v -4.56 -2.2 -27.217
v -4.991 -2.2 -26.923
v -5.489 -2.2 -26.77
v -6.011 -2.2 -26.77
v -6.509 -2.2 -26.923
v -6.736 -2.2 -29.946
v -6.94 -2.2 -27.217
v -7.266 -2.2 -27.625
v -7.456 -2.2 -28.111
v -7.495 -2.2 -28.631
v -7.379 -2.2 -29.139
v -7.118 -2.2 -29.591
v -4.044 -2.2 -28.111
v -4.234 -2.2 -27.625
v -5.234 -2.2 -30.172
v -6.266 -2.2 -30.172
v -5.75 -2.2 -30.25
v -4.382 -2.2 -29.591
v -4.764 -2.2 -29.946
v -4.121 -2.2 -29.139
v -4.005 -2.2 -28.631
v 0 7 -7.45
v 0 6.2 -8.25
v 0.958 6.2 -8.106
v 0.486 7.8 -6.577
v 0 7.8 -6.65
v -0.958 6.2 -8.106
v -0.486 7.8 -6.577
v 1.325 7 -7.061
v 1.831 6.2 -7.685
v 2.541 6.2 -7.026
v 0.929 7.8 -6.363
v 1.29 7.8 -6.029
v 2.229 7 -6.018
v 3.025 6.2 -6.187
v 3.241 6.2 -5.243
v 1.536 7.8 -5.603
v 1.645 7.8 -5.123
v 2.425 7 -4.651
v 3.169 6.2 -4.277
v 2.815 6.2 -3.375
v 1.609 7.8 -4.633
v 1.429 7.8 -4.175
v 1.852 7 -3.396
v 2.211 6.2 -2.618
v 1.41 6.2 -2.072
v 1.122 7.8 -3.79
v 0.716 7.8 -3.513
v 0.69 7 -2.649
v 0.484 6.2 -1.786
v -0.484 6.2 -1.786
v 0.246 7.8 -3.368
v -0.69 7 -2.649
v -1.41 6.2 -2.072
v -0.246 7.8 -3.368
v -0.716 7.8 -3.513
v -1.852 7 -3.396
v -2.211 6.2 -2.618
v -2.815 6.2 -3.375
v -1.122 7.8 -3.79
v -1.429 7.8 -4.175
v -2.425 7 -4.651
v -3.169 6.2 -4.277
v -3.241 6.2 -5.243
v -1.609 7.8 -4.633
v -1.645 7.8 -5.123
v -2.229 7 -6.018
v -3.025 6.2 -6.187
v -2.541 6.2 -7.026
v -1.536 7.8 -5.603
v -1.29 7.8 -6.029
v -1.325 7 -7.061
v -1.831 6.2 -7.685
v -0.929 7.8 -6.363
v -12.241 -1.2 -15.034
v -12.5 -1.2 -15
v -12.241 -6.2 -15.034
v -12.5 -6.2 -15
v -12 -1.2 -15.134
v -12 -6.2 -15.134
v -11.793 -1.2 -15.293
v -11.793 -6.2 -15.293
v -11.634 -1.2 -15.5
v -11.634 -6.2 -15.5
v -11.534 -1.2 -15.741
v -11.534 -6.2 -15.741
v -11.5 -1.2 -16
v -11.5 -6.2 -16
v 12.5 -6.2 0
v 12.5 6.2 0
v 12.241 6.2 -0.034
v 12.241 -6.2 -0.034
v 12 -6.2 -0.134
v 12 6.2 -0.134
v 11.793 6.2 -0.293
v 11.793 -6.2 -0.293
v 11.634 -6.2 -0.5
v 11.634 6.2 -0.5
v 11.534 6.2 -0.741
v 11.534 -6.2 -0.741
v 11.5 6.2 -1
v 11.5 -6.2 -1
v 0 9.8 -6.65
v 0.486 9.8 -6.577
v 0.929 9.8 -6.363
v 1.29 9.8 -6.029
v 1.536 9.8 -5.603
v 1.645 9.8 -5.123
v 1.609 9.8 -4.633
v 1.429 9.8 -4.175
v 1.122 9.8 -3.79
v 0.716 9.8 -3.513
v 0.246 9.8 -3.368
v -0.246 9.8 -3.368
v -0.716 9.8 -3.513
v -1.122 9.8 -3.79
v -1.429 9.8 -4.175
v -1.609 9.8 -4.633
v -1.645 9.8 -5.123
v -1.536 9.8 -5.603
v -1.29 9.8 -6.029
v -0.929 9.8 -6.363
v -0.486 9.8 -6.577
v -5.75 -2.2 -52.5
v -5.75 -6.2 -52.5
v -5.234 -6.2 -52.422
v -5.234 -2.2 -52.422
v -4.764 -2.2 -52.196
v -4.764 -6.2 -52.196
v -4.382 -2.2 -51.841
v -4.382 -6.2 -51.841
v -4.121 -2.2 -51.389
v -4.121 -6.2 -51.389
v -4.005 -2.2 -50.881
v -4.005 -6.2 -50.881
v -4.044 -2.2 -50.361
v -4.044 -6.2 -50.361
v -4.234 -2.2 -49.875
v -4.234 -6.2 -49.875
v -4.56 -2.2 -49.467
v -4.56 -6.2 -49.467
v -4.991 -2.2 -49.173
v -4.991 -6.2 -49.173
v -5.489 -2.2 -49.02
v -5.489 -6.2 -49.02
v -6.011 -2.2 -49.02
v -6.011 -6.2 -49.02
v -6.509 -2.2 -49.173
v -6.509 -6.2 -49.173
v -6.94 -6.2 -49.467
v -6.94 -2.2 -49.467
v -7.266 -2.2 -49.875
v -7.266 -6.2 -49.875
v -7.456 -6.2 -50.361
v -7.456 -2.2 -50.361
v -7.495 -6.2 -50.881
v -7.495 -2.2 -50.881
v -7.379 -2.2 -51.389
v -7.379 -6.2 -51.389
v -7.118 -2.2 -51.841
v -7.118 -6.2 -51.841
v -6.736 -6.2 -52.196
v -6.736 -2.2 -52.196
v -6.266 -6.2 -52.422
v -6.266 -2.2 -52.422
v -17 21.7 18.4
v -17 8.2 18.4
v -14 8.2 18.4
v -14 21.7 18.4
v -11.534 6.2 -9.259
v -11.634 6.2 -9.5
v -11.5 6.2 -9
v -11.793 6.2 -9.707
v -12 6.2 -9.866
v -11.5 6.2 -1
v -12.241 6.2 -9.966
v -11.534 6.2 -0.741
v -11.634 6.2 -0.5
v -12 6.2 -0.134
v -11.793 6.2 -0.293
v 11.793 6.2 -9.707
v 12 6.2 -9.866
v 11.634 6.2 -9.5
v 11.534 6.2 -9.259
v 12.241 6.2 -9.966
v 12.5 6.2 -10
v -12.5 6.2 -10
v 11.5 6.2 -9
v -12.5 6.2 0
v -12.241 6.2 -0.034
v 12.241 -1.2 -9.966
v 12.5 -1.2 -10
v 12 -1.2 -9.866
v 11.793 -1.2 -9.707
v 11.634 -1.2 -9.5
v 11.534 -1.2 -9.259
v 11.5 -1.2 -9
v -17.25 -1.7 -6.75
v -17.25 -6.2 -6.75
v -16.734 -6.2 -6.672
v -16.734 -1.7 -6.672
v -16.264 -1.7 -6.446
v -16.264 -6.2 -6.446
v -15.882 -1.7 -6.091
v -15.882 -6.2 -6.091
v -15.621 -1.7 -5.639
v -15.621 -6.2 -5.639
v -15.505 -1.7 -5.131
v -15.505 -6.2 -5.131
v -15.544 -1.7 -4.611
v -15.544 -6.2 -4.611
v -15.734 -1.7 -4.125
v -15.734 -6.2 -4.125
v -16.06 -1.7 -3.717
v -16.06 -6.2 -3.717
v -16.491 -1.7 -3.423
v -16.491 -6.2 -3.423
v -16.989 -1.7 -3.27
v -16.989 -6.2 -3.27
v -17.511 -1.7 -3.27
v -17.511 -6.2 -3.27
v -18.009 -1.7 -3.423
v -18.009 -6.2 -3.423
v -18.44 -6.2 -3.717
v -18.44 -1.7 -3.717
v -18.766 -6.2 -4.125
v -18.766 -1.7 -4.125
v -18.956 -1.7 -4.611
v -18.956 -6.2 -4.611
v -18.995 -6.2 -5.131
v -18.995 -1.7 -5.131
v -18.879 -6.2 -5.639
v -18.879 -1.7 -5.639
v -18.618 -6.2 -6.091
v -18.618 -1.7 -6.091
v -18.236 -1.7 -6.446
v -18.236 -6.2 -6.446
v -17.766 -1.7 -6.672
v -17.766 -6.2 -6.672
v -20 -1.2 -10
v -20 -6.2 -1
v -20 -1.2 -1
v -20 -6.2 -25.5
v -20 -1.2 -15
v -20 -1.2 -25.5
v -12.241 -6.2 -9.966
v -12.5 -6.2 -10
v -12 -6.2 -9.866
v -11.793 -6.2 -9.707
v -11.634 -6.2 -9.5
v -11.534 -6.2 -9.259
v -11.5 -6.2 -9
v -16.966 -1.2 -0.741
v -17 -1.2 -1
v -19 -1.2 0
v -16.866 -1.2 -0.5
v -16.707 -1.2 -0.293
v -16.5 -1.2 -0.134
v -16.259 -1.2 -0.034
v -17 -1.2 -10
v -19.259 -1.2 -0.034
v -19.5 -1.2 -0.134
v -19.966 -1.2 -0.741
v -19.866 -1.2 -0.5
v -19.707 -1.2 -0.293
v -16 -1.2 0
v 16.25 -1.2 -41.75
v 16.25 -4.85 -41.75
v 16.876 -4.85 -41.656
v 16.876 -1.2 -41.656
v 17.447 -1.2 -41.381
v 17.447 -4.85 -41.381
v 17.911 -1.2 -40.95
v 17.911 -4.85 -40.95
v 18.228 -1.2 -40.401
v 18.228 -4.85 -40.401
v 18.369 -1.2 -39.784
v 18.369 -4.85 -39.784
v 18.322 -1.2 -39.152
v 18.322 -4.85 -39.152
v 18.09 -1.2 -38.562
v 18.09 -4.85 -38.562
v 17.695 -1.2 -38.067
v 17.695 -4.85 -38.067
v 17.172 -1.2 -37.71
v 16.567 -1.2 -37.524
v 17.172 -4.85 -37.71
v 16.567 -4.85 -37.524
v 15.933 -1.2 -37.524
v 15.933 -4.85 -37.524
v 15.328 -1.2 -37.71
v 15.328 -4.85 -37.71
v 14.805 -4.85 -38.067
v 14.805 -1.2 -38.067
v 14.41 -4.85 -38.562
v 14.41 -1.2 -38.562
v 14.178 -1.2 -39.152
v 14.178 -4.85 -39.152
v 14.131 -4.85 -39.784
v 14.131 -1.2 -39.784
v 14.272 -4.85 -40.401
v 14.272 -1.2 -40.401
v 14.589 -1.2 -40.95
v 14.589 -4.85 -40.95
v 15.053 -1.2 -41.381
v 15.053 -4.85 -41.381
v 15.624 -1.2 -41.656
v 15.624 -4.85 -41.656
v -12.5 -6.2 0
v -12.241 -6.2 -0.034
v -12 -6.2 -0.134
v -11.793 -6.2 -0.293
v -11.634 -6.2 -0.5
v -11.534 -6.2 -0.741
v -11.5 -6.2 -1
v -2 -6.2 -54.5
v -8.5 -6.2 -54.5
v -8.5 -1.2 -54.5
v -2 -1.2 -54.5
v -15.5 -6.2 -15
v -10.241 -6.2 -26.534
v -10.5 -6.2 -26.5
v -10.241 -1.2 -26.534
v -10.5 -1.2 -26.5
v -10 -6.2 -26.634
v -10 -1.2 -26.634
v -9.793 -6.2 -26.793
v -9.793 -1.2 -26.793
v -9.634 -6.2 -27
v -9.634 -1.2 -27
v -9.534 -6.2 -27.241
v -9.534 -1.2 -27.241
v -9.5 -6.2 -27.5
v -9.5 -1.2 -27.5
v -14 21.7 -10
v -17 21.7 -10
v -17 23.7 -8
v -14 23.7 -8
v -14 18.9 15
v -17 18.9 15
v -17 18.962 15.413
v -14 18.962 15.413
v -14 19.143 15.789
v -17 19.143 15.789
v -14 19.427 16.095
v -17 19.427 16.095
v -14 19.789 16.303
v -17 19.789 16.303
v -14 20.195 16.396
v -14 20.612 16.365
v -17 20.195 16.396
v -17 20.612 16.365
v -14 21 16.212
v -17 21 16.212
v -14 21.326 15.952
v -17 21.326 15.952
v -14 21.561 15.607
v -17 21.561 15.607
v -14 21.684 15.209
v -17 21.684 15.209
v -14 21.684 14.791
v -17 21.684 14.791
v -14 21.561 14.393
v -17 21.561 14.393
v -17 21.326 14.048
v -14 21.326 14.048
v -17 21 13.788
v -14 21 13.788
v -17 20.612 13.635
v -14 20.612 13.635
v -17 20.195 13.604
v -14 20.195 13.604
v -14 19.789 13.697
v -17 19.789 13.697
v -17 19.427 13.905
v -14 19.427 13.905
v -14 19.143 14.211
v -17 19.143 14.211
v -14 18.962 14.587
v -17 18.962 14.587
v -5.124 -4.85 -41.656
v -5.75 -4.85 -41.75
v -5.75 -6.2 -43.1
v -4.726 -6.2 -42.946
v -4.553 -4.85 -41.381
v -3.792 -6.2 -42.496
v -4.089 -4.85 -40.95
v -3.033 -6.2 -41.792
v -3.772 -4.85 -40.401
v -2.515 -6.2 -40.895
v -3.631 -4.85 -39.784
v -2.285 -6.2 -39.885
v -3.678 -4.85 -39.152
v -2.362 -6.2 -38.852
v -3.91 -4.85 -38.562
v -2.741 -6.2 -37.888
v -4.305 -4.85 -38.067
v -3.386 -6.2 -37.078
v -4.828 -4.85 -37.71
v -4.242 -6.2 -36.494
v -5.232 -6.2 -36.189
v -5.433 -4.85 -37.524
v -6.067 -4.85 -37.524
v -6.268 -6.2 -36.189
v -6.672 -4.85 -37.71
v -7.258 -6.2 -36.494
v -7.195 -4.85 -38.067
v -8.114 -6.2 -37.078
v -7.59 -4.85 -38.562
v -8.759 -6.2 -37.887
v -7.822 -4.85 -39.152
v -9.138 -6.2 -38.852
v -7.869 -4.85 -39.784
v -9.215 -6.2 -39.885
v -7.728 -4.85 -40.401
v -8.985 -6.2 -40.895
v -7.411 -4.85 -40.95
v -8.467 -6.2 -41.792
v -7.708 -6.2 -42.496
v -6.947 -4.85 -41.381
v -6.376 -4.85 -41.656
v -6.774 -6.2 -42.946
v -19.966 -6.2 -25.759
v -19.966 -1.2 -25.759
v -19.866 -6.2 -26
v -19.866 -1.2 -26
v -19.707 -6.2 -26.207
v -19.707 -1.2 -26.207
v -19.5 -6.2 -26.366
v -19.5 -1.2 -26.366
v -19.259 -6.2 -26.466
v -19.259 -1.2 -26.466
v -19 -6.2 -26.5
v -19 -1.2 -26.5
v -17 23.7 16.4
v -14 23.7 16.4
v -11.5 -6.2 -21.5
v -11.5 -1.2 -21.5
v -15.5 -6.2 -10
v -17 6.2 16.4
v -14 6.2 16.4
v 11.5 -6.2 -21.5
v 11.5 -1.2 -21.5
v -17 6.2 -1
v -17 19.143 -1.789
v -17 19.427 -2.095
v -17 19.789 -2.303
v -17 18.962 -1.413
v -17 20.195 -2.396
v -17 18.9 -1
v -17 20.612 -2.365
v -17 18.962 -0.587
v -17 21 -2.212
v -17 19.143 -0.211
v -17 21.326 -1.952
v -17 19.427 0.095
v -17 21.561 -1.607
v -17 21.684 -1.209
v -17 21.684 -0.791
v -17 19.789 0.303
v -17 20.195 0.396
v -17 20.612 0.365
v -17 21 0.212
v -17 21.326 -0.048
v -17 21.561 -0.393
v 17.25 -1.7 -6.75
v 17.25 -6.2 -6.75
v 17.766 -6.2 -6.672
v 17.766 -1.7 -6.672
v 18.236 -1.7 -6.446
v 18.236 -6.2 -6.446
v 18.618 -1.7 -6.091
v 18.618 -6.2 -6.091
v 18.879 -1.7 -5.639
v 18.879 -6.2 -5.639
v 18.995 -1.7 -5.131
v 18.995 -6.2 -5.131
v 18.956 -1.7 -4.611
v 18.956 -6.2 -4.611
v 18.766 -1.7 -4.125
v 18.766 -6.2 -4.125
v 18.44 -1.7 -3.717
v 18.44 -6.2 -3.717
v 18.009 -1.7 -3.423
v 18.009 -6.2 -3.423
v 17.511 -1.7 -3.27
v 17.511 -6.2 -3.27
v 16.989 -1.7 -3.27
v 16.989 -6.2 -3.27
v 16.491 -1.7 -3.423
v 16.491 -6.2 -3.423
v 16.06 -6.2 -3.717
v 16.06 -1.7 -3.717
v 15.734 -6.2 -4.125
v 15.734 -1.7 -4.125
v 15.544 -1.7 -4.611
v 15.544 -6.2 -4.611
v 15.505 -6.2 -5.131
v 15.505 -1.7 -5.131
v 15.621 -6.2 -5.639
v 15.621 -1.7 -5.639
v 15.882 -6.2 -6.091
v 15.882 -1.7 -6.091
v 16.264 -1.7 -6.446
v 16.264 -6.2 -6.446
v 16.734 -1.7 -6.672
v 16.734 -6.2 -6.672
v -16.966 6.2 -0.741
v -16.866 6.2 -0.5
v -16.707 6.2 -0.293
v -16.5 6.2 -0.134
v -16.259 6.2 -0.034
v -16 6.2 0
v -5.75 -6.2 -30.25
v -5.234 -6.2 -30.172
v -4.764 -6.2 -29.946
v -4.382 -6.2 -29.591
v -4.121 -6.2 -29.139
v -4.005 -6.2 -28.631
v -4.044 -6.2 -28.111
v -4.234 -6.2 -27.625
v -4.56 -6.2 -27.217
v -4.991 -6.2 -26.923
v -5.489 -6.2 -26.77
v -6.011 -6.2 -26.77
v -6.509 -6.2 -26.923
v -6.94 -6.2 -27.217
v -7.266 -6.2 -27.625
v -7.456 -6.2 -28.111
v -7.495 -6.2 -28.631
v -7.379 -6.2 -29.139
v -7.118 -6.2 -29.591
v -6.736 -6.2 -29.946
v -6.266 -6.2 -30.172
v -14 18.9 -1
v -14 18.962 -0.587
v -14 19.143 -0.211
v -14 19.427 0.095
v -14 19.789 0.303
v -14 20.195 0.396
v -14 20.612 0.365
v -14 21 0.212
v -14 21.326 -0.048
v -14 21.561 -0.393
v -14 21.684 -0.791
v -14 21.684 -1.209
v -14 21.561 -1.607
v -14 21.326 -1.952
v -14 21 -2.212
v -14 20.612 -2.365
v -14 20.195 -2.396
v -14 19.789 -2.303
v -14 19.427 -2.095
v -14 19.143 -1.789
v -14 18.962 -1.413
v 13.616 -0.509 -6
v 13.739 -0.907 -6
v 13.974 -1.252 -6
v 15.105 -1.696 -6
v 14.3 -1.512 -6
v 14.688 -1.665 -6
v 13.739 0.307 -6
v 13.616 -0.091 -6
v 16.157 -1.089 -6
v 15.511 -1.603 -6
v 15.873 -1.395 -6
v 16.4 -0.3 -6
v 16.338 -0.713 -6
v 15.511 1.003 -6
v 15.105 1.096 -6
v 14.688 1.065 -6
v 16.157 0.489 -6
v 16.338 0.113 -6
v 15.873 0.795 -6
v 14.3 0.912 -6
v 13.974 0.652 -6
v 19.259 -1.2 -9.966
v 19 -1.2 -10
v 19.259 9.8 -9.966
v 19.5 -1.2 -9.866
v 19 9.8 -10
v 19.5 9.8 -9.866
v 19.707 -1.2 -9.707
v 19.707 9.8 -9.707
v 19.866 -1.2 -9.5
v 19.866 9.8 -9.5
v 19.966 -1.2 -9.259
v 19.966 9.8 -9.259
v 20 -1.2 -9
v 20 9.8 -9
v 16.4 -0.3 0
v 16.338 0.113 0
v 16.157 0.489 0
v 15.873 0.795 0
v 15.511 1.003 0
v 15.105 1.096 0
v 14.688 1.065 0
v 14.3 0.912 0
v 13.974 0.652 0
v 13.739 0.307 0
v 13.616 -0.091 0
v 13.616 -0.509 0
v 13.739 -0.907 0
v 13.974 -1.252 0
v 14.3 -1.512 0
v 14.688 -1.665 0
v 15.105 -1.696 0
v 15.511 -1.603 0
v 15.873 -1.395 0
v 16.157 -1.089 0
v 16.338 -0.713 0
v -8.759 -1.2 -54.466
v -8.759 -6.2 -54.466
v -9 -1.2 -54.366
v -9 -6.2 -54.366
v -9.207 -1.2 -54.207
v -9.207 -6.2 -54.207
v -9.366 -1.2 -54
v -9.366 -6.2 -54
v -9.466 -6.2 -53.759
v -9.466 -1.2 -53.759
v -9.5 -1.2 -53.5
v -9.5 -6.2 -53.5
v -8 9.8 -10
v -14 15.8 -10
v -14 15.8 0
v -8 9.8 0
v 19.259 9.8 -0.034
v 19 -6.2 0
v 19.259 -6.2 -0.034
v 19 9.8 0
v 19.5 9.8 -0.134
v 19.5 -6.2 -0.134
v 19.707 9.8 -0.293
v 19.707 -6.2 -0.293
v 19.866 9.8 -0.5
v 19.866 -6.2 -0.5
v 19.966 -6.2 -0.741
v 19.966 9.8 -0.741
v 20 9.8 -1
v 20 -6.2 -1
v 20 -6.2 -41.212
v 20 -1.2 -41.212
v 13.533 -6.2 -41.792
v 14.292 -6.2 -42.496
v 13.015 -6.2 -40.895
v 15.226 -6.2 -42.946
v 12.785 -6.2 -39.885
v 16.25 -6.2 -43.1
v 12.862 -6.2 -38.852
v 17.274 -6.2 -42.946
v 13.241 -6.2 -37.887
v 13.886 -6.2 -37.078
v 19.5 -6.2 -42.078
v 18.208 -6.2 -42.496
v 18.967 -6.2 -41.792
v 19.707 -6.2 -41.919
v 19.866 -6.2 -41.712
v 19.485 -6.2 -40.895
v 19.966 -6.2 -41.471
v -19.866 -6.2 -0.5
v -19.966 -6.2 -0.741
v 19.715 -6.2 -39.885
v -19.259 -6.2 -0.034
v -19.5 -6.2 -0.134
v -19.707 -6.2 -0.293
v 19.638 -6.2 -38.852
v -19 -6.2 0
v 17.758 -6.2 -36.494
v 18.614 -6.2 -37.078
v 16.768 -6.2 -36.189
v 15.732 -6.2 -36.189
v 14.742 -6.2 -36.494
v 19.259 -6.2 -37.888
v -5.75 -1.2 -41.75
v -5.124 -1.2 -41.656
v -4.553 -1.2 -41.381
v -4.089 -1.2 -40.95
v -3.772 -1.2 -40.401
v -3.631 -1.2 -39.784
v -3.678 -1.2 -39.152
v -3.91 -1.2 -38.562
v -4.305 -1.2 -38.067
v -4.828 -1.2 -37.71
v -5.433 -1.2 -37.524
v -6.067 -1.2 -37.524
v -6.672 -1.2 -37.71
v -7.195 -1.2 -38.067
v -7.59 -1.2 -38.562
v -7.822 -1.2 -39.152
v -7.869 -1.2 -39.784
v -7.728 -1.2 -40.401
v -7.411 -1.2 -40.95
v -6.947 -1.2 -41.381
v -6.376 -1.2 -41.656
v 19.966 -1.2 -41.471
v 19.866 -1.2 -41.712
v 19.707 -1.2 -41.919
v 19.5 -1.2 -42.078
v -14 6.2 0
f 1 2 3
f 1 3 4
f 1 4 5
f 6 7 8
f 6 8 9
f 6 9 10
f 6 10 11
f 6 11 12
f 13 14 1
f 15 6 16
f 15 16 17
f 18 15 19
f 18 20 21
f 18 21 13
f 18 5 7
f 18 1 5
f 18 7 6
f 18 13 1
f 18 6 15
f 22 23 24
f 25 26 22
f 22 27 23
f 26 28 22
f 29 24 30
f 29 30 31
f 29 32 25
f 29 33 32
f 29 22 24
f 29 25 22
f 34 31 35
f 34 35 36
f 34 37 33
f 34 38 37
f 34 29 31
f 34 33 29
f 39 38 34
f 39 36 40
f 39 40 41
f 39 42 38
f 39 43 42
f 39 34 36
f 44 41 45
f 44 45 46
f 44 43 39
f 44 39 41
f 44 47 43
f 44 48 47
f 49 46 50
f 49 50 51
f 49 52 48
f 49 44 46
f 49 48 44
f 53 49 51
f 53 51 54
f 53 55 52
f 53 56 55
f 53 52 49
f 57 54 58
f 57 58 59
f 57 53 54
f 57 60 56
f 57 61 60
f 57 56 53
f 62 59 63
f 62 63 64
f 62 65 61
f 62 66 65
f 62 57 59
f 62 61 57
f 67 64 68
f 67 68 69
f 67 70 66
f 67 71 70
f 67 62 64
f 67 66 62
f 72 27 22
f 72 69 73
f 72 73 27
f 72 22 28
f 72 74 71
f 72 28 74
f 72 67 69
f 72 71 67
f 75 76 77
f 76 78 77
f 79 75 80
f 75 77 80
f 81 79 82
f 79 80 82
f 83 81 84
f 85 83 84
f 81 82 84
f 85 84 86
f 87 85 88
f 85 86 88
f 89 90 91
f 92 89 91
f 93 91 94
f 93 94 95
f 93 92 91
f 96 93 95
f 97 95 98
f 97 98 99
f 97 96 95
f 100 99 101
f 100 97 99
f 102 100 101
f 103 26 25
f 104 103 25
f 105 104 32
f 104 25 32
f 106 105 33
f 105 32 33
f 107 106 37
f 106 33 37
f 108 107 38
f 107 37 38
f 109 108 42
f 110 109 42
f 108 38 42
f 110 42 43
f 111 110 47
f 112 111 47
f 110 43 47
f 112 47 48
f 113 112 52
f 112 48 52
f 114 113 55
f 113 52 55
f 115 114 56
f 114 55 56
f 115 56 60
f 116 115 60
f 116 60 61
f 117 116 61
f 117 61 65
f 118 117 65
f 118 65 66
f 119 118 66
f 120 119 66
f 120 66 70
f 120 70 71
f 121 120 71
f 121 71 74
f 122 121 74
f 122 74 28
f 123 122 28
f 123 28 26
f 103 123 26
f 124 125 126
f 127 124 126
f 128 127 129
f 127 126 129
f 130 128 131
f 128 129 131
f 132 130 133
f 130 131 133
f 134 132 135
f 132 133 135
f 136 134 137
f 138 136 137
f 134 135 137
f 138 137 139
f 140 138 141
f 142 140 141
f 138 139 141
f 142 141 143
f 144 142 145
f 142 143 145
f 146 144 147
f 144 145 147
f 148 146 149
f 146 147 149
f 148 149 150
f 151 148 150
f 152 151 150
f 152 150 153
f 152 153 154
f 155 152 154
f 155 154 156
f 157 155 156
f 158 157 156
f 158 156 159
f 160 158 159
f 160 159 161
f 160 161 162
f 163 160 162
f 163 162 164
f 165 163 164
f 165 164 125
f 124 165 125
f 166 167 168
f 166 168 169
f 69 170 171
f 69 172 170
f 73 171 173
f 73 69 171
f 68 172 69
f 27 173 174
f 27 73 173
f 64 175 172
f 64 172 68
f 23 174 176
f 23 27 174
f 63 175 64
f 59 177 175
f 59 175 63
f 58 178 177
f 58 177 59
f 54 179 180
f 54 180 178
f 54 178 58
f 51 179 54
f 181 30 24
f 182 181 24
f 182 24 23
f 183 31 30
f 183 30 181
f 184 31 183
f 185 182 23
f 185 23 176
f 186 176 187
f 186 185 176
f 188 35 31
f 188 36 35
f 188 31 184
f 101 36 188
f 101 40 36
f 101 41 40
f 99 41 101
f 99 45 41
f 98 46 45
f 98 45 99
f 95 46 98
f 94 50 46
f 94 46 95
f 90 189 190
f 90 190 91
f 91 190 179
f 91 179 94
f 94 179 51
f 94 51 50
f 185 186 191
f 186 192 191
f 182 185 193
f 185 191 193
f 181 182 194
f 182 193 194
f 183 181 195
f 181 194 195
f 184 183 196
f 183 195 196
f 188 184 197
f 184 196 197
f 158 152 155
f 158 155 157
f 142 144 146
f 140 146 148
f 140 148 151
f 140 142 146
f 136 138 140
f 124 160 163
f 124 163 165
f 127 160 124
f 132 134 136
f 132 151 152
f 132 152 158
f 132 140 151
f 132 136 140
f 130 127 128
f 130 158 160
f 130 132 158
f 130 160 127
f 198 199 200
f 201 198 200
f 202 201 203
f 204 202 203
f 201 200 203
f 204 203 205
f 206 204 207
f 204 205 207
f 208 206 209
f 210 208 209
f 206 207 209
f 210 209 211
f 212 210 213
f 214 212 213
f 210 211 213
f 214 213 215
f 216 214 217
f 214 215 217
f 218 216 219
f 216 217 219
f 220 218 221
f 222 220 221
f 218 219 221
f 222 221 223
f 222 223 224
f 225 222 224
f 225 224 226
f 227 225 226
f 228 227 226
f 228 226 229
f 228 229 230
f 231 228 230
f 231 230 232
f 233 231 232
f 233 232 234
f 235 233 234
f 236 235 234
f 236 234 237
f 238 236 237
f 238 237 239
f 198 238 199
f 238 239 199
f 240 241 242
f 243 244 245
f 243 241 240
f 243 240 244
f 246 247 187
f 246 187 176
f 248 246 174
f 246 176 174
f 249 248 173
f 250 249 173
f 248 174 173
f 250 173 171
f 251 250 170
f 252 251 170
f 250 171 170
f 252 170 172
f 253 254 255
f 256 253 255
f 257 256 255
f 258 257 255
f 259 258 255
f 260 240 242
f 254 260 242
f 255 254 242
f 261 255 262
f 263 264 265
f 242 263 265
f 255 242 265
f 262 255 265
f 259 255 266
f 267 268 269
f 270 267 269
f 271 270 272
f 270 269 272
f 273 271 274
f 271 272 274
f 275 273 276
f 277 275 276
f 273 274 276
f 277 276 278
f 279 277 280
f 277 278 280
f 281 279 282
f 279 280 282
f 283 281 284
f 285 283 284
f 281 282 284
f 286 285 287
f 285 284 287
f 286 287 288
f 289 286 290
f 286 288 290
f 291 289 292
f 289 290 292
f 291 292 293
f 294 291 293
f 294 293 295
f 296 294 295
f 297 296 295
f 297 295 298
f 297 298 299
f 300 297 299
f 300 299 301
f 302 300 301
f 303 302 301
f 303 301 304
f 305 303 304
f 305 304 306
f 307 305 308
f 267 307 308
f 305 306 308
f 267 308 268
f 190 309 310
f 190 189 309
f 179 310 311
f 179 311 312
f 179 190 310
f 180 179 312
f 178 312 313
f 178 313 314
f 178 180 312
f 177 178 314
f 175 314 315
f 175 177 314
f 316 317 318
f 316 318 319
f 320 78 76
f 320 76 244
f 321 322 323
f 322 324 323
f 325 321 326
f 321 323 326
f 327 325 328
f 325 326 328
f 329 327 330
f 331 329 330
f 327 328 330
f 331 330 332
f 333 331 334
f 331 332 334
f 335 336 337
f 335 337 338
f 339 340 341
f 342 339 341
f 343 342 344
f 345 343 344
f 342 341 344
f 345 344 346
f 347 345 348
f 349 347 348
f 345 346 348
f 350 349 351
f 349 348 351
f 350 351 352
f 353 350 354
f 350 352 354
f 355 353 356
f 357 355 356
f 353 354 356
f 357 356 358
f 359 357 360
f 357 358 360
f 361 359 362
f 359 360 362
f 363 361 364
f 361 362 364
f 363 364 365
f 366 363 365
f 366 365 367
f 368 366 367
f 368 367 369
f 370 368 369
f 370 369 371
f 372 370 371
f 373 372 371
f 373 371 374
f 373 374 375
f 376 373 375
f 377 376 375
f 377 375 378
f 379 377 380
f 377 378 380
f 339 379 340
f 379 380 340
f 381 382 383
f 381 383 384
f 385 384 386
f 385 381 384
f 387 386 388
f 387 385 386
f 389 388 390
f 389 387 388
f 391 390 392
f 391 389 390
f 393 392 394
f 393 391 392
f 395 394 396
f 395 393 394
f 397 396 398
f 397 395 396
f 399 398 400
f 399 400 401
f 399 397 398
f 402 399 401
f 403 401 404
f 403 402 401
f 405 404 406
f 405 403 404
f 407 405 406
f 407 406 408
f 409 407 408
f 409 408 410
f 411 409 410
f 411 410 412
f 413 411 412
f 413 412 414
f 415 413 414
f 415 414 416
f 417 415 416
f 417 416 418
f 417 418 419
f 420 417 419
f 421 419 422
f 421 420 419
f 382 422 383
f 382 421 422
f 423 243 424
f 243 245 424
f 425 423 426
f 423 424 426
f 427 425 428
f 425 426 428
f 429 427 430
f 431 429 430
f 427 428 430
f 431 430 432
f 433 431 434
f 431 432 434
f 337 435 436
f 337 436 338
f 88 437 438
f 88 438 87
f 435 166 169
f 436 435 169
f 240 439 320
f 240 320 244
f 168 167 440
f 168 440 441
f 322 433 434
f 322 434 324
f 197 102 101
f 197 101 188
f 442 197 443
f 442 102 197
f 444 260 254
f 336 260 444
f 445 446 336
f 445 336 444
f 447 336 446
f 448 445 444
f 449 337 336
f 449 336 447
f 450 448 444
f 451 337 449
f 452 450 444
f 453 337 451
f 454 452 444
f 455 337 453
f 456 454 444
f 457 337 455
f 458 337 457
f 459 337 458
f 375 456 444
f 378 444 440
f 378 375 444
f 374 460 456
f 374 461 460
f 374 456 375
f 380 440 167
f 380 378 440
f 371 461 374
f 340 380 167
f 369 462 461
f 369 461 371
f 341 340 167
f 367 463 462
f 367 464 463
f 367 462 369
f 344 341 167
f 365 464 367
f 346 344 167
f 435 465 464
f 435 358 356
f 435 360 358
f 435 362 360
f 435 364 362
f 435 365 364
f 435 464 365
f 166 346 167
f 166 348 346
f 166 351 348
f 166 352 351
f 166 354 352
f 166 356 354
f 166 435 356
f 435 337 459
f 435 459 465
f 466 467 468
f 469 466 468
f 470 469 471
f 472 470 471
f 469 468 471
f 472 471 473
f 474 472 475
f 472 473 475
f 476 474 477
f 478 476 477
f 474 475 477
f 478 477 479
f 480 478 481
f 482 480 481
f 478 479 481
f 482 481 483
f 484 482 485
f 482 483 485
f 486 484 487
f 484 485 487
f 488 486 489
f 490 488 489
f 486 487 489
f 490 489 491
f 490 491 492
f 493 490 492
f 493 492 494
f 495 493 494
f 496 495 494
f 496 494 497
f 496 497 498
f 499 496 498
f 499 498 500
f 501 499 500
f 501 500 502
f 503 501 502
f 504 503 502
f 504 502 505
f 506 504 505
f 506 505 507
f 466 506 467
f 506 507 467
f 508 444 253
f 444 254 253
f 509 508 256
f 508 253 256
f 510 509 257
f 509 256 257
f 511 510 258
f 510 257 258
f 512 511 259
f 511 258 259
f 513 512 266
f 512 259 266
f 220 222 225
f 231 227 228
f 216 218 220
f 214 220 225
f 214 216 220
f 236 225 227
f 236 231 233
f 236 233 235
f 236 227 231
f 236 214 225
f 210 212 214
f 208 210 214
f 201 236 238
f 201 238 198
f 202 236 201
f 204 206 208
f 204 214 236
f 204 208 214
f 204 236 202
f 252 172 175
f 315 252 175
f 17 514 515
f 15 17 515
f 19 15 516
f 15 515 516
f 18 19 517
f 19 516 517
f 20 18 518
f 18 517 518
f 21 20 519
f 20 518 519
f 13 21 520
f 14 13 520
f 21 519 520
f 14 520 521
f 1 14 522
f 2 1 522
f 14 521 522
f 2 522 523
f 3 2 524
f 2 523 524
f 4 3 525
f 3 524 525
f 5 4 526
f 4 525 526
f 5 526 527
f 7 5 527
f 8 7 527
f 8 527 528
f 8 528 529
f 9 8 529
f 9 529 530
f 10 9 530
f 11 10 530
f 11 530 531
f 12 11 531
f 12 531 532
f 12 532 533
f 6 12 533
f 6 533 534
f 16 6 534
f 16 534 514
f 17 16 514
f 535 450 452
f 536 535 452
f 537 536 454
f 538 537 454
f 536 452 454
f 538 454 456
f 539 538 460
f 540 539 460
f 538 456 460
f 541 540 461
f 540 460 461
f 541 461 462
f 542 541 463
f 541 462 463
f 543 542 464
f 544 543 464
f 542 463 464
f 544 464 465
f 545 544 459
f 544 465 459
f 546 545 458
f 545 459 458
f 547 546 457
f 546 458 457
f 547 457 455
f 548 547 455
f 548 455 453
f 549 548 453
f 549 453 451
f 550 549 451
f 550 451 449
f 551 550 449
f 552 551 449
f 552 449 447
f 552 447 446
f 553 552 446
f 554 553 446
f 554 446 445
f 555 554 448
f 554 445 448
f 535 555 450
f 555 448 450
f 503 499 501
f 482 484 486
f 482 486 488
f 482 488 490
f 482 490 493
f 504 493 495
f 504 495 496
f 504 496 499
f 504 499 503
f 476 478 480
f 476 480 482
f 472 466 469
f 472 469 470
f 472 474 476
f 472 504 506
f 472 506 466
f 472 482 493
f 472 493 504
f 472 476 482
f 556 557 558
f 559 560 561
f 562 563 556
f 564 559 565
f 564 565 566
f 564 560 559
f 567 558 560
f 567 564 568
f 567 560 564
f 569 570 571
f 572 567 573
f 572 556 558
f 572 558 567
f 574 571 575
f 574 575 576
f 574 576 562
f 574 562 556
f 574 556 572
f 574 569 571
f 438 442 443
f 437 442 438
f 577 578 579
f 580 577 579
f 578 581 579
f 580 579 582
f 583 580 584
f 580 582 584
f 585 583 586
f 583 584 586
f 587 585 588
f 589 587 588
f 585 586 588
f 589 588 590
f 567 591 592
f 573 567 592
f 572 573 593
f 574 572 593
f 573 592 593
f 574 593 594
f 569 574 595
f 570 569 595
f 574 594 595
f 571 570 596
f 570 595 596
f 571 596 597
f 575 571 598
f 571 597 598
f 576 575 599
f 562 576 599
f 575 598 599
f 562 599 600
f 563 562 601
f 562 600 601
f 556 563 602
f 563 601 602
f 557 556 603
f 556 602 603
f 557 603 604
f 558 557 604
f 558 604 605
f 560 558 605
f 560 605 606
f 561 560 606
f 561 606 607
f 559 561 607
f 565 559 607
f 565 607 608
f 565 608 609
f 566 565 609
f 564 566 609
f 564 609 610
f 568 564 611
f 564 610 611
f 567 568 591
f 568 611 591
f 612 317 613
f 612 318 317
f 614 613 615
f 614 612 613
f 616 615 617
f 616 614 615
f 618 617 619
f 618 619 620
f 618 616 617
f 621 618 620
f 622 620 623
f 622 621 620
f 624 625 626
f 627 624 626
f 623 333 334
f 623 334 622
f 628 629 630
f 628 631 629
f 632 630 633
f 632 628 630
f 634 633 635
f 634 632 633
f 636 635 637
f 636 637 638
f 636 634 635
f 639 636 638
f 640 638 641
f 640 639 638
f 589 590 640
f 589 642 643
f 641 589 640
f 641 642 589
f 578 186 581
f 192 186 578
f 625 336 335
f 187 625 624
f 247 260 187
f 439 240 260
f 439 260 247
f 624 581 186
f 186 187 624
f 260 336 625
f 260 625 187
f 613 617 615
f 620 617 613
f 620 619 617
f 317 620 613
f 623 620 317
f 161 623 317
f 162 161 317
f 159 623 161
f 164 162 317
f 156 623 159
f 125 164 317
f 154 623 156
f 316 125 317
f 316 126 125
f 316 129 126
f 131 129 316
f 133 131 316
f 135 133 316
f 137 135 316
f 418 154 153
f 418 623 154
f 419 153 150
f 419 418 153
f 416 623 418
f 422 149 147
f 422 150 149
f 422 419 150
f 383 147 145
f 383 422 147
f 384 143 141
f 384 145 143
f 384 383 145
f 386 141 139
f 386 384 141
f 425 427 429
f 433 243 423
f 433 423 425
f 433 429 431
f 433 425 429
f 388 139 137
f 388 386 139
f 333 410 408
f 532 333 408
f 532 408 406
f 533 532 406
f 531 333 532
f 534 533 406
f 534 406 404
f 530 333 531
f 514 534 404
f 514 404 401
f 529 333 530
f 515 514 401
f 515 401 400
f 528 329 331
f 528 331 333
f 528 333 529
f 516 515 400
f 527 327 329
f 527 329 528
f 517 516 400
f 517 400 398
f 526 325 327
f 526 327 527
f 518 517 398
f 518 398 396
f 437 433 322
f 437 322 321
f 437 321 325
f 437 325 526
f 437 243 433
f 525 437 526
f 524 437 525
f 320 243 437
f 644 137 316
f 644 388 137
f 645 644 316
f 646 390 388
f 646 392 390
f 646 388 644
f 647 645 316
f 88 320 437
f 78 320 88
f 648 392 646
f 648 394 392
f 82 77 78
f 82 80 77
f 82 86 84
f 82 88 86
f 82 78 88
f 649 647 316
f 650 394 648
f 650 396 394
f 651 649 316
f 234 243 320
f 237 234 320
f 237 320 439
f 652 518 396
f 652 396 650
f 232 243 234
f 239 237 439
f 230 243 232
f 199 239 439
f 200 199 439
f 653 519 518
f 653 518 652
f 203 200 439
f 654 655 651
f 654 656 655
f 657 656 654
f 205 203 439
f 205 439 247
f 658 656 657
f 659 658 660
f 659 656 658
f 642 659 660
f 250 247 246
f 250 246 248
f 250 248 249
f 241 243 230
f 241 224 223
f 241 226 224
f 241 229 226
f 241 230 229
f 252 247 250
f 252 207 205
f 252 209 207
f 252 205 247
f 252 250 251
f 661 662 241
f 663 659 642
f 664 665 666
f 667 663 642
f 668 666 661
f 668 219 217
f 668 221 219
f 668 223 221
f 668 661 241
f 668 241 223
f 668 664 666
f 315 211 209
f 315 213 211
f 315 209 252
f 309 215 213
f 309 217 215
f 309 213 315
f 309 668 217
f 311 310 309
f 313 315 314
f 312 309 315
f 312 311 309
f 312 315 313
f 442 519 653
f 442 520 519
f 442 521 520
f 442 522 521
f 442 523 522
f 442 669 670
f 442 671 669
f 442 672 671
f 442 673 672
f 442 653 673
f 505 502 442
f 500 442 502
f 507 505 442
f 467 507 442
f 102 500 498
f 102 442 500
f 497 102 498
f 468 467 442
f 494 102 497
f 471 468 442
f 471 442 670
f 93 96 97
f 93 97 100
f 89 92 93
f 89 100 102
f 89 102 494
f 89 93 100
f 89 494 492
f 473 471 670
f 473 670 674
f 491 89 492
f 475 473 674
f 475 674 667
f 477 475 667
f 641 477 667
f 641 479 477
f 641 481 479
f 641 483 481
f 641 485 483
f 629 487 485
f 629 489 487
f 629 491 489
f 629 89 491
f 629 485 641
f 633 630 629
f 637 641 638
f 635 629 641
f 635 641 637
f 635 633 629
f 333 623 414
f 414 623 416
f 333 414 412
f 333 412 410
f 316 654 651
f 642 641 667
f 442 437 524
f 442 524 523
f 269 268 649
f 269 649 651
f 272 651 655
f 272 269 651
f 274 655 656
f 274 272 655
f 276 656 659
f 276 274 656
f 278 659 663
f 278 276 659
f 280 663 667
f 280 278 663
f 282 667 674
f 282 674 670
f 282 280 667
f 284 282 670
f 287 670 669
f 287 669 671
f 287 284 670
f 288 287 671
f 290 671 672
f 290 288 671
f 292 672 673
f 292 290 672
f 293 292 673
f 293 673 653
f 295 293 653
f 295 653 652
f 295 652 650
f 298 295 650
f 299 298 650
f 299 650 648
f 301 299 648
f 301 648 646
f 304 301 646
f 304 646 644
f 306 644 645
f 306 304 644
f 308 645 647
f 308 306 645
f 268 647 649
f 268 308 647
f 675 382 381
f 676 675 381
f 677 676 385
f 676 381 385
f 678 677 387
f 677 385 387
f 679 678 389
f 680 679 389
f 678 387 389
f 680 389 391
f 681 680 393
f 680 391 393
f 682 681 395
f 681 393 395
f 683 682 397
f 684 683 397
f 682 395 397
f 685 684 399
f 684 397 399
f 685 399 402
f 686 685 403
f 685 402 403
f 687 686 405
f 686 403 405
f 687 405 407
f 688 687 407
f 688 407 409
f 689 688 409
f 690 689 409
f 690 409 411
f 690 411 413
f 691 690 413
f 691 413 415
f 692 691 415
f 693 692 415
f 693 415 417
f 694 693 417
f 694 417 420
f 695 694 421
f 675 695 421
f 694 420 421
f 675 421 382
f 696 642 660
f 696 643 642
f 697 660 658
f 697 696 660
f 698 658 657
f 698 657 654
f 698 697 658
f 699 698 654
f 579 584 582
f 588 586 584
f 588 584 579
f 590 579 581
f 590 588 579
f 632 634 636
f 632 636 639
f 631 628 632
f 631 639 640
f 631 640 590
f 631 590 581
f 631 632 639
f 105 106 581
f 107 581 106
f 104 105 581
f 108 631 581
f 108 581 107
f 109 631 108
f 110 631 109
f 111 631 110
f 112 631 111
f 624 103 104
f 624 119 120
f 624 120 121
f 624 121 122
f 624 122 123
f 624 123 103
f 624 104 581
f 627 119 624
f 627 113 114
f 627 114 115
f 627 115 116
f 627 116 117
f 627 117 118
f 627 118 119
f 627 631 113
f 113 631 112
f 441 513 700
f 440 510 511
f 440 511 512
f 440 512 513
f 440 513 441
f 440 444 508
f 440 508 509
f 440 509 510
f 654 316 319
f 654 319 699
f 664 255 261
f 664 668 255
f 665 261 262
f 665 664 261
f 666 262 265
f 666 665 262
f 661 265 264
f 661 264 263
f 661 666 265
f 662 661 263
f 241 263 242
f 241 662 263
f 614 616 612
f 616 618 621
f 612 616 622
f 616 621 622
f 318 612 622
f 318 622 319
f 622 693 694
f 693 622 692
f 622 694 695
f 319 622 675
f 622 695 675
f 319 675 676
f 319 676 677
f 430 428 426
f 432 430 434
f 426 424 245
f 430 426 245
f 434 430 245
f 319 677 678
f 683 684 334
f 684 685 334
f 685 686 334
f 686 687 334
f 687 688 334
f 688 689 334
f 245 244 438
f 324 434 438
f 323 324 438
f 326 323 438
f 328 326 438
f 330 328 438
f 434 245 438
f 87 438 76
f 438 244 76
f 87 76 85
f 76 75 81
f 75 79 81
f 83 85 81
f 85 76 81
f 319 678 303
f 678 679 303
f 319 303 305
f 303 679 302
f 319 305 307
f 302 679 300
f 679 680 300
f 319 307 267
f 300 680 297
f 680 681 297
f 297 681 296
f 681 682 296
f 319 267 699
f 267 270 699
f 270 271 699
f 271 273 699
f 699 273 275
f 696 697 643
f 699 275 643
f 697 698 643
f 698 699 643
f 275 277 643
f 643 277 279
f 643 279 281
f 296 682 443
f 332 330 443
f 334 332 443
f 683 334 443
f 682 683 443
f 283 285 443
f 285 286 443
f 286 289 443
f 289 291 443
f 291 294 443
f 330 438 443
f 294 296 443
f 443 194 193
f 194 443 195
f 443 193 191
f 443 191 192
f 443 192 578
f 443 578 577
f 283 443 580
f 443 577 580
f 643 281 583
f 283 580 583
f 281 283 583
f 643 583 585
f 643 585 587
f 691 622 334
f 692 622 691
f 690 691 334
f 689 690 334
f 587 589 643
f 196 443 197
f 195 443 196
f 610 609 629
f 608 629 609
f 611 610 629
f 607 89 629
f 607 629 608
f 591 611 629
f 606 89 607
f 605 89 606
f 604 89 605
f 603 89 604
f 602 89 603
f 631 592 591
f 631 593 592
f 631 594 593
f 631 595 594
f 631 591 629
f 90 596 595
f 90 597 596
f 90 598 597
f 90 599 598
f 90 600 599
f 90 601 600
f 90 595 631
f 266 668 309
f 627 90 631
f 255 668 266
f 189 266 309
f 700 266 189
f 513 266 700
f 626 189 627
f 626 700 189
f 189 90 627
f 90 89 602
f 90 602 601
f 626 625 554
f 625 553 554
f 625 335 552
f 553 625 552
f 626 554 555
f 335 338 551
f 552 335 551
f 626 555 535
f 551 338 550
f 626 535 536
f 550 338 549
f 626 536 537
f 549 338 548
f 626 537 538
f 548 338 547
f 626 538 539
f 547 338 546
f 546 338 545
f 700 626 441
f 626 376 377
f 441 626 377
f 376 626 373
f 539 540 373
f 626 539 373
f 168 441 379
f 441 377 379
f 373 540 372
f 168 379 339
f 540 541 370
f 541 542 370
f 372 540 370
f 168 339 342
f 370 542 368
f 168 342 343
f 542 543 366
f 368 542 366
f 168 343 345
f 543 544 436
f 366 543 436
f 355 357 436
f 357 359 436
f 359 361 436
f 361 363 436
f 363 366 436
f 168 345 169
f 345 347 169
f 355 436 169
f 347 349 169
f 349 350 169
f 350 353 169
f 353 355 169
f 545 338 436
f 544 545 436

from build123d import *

# Parameters (mm, degrees)
BOSS_EXTRUDE1_DEPTH = 10
SKETCH5_R           = 1.4
CUT_EXTRUDE2_DEPTH  = 6
SKETCH4_R           = 1.75
CUT_EXTRUDE1_DEPTH  = 4.5
SKETCH6_R           = 1.75
SKETCH6_R_2         = 2.125
BOSS_EXTRUDE3_DEPTH = 5
BOSS_EXTRUDE4_START = -4
SKETCH6_3_R         = 1.75
BOSS_EXTRUDE4_DEPTH = 1
CUT_EXTRUDE3_DEPTH  = 5
SKETCH8_W           = 10
SKETCH8_H           = 11
CUT_EXTRUDE4_DEPTH  = 3
SKETCH10_R          = 1.4
BOSS_EXTRUDE5_DEPTH = 3
CHAMFER1_SIZE       = 2
FILLET1_R           = 1
CHAMFER2_SIZE       = 1.35
CHAMFER3_SIZE       = 6
SKETCH12_R          = 1.65
CUT_EXTRUDE6_DEPTH  = 61.634148794
CHAMFER4_SIZE       = 1.6


with BuildPart() as part:
    # Sketch2 → Boss-Extrude1 (new body)
    with BuildSketch(Plane.XY):
        Polygon((11.5, -6.2), (20, -6.2), (20, 9.8), (-20, 9.8), (-20, -6.2), (-11.5, -6.2), (-11.5, 6.2), (11.5, 6.2), align=None)
    extrude(amount=-BOSS_EXTRUDE1_DEPTH)

    # Sketch5 → Cut-Extrude2 (cut)
    with BuildSketch(Plane.XY):
        with Locations((15, -0.3)):
            Circle(SKETCH5_R)
    extrude(amount=-CUT_EXTRUDE2_DEPTH, mode=Mode.SUBTRACT)

    # Sketch4 → Cut-Extrude1 (cut)
    with BuildSketch(Plane.XZ.offset(6.2)):
        with Locations(Location((-17.25, -5, 0), (0, 0, 270))):
            Circle(SKETCH4_R)
        with Locations(Location((17.25, -5, 0), (0, 0, 270))):
            Circle(SKETCH4_R)
    extrude(amount=-CUT_EXTRUDE1_DEPTH, mode=Mode.SUBTRACT)

    # Sketch6 → Boss-Extrude3 (add)
    with BuildSketch(Plane.XZ.offset(6.2)):
        Polygon((-11.5, -10), (-20, -10), (-20, -26.5), (-9.5, -26.5), (-9.5, -54.5), (-2, -54.5), (20, -41.789296909), (20, -10), (11.5, -10), (11.5, -21.5), (-11.5, -21.5), align=None)
        with Locations(Location((-5.75, -28.5, 0), (0, 0, 270))):
            Circle(SKETCH6_R, mode=Mode.SUBTRACT)
        with Locations(Location((-5.75, -39.625, 0), (0, 0, 270))):
            Circle(SKETCH6_R_2, mode=Mode.SUBTRACT)
        with Locations(Location((-5.75, -50.75, 0), (0, 0, 270))):
            Circle(SKETCH6_R, mode=Mode.SUBTRACT)
        with Locations(Location((16.25, -39.625, 0), (0, 0, 270))):
            Circle(SKETCH6_R_2, mode=Mode.SUBTRACT)
    extrude(amount=-BOSS_EXTRUDE3_DEPTH)

    # Sketch6<3> → Boss-Extrude4 (add)
    with BuildSketch(Plane.XZ.offset(6.2).offset(BOSS_EXTRUDE4_START)):
        with Locations(Location((-5.75, -50.75, 0), (0, 0, 270))):
            Circle(SKETCH6_3_R)
        with Locations(Location((-5.75, -28.5, 0), (0, 0, 270))):
            Circle(SKETCH6_3_R)
    extrude(amount=-BOSS_EXTRUDE4_DEPTH)

    # Sketch7 → Cut-Extrude3 (cut)
    with BuildSketch(Plane(origin=(0, 0, -10), x_dir=(-1, 0, 0), z_dir=(0, 0, -1))):
        Polygon((11.5, -1.2), (11.5, -6.2), (15.5, -6.2), (20, -1.2), align=None)
    extrude(amount=CUT_EXTRUDE3_DEPTH, mode=Mode.SUBTRACT)

    # Sketch8 → Cut-Extrude4 (cut)
    with BuildSketch(Plane.ZY.offset(20)):
        with Locations((-5, 4.3)):
            Rectangle(SKETCH8_W, SKETCH8_H)
    extrude(amount=-CUT_EXTRUDE4_DEPTH, mode=Mode.SUBTRACT)

    # Sketch10 → Boss-Extrude5 (add)
    with BuildSketch(Plane.ZY.offset(17)):
        with BuildLine():
            Line((0, 6.2), (18.4, 6.2))
            Line((18.4, 6.2), (18.4, 23.7))
            Line((18.4, 23.7), (-10, 23.7))
            Line((-10, 23.7), (-10, -1.2))
            Line((-10, -1.2), (0, -1.2))
            Line((0, -1.2), (0, 3.320204103))
            ThreePointArc((0, 3.320204103), (-2.4, 4.3), (0, 5.279795897))
            Line((0, 5.279795897), (0, 6.2))
        make_face()
        with Locations(Location((-1, 20.3, 0), (0, 0, 270))):
            Circle(SKETCH10_R, mode=Mode.SUBTRACT)
        with Locations(Location((15, 20.3, 0), (0, 0, 270))):
            Circle(SKETCH10_R, mode=Mode.SUBTRACT)
    extrude(amount=-BOSS_EXTRUDE5_DEPTH)

    # Chamfer1
    chamfer1_edges = [part.edges().sort_by_distance(p)[0] for p in [
        (-15.5, 6.2, 18.4),
        (-15.5, 23.7, -10),
        (-15.5, 23.7, 18.4),
    ]]
    chamfer(chamfer1_edges, length=CHAMFER1_SIZE)

    # Fillet1
    fillet1_edges = [part.edges().sort_by_distance(p)[0] for p in [
        (-11.5, -3.7, -15),
        (20, 1.8, 0),
        (-20, -3.7, 0),
        (11.5, 0, 0),
        (-17, 2.5, 0),
        (-11.5, 0, -10),
        (20, 4.3, -10),
        (-9.5, -3.7, -54.5),
        (-9.5, -3.7, -26.5),
        (-20, -3.7, -26.5),
        (20, -3.7, -41.789296909),
        (11.5, 2.5, -10),
        (-11.5, 0, 0),
    ]]
    fillet(fillet1_edges, radius=FILLET1_R)

    # Chamfer2
    chamfer2_edges = [part.edges().sort_by_distance(p)[0] for p in [
        (-5.75, -6.2, -37.5),
        (16.25, -6.2, -37.5),
    ]]
    chamfer(chamfer2_edges, length=CHAMFER2_SIZE)

    # Chamfer3
    chamfer3_edges = [part.edges().sort_by_distance(p)[0] for p in [
        (-14, 9.8, -5),
    ]]
    chamfer(chamfer3_edges, length=CHAMFER3_SIZE)

    # Sketch12 → Cut-Extrude6 (cut, through all)
    with BuildSketch(Plane.XZ.offset(-6.2)):
        with Locations(Location((0, -5, 0), (0, 0, 270))):
            Circle(SKETCH12_R)
    extrude(amount=-CUT_EXTRUDE6_DEPTH, mode=Mode.SUBTRACT)

    # Chamfer4
    chamfer4_edges = [part.edges().sort_by_distance(p)[0] for p in [
        (0, 6.2, -3.35),
    ]]
    chamfer(chamfer4_edges, length=CHAMFER4_SIZE)


solid = part.part
